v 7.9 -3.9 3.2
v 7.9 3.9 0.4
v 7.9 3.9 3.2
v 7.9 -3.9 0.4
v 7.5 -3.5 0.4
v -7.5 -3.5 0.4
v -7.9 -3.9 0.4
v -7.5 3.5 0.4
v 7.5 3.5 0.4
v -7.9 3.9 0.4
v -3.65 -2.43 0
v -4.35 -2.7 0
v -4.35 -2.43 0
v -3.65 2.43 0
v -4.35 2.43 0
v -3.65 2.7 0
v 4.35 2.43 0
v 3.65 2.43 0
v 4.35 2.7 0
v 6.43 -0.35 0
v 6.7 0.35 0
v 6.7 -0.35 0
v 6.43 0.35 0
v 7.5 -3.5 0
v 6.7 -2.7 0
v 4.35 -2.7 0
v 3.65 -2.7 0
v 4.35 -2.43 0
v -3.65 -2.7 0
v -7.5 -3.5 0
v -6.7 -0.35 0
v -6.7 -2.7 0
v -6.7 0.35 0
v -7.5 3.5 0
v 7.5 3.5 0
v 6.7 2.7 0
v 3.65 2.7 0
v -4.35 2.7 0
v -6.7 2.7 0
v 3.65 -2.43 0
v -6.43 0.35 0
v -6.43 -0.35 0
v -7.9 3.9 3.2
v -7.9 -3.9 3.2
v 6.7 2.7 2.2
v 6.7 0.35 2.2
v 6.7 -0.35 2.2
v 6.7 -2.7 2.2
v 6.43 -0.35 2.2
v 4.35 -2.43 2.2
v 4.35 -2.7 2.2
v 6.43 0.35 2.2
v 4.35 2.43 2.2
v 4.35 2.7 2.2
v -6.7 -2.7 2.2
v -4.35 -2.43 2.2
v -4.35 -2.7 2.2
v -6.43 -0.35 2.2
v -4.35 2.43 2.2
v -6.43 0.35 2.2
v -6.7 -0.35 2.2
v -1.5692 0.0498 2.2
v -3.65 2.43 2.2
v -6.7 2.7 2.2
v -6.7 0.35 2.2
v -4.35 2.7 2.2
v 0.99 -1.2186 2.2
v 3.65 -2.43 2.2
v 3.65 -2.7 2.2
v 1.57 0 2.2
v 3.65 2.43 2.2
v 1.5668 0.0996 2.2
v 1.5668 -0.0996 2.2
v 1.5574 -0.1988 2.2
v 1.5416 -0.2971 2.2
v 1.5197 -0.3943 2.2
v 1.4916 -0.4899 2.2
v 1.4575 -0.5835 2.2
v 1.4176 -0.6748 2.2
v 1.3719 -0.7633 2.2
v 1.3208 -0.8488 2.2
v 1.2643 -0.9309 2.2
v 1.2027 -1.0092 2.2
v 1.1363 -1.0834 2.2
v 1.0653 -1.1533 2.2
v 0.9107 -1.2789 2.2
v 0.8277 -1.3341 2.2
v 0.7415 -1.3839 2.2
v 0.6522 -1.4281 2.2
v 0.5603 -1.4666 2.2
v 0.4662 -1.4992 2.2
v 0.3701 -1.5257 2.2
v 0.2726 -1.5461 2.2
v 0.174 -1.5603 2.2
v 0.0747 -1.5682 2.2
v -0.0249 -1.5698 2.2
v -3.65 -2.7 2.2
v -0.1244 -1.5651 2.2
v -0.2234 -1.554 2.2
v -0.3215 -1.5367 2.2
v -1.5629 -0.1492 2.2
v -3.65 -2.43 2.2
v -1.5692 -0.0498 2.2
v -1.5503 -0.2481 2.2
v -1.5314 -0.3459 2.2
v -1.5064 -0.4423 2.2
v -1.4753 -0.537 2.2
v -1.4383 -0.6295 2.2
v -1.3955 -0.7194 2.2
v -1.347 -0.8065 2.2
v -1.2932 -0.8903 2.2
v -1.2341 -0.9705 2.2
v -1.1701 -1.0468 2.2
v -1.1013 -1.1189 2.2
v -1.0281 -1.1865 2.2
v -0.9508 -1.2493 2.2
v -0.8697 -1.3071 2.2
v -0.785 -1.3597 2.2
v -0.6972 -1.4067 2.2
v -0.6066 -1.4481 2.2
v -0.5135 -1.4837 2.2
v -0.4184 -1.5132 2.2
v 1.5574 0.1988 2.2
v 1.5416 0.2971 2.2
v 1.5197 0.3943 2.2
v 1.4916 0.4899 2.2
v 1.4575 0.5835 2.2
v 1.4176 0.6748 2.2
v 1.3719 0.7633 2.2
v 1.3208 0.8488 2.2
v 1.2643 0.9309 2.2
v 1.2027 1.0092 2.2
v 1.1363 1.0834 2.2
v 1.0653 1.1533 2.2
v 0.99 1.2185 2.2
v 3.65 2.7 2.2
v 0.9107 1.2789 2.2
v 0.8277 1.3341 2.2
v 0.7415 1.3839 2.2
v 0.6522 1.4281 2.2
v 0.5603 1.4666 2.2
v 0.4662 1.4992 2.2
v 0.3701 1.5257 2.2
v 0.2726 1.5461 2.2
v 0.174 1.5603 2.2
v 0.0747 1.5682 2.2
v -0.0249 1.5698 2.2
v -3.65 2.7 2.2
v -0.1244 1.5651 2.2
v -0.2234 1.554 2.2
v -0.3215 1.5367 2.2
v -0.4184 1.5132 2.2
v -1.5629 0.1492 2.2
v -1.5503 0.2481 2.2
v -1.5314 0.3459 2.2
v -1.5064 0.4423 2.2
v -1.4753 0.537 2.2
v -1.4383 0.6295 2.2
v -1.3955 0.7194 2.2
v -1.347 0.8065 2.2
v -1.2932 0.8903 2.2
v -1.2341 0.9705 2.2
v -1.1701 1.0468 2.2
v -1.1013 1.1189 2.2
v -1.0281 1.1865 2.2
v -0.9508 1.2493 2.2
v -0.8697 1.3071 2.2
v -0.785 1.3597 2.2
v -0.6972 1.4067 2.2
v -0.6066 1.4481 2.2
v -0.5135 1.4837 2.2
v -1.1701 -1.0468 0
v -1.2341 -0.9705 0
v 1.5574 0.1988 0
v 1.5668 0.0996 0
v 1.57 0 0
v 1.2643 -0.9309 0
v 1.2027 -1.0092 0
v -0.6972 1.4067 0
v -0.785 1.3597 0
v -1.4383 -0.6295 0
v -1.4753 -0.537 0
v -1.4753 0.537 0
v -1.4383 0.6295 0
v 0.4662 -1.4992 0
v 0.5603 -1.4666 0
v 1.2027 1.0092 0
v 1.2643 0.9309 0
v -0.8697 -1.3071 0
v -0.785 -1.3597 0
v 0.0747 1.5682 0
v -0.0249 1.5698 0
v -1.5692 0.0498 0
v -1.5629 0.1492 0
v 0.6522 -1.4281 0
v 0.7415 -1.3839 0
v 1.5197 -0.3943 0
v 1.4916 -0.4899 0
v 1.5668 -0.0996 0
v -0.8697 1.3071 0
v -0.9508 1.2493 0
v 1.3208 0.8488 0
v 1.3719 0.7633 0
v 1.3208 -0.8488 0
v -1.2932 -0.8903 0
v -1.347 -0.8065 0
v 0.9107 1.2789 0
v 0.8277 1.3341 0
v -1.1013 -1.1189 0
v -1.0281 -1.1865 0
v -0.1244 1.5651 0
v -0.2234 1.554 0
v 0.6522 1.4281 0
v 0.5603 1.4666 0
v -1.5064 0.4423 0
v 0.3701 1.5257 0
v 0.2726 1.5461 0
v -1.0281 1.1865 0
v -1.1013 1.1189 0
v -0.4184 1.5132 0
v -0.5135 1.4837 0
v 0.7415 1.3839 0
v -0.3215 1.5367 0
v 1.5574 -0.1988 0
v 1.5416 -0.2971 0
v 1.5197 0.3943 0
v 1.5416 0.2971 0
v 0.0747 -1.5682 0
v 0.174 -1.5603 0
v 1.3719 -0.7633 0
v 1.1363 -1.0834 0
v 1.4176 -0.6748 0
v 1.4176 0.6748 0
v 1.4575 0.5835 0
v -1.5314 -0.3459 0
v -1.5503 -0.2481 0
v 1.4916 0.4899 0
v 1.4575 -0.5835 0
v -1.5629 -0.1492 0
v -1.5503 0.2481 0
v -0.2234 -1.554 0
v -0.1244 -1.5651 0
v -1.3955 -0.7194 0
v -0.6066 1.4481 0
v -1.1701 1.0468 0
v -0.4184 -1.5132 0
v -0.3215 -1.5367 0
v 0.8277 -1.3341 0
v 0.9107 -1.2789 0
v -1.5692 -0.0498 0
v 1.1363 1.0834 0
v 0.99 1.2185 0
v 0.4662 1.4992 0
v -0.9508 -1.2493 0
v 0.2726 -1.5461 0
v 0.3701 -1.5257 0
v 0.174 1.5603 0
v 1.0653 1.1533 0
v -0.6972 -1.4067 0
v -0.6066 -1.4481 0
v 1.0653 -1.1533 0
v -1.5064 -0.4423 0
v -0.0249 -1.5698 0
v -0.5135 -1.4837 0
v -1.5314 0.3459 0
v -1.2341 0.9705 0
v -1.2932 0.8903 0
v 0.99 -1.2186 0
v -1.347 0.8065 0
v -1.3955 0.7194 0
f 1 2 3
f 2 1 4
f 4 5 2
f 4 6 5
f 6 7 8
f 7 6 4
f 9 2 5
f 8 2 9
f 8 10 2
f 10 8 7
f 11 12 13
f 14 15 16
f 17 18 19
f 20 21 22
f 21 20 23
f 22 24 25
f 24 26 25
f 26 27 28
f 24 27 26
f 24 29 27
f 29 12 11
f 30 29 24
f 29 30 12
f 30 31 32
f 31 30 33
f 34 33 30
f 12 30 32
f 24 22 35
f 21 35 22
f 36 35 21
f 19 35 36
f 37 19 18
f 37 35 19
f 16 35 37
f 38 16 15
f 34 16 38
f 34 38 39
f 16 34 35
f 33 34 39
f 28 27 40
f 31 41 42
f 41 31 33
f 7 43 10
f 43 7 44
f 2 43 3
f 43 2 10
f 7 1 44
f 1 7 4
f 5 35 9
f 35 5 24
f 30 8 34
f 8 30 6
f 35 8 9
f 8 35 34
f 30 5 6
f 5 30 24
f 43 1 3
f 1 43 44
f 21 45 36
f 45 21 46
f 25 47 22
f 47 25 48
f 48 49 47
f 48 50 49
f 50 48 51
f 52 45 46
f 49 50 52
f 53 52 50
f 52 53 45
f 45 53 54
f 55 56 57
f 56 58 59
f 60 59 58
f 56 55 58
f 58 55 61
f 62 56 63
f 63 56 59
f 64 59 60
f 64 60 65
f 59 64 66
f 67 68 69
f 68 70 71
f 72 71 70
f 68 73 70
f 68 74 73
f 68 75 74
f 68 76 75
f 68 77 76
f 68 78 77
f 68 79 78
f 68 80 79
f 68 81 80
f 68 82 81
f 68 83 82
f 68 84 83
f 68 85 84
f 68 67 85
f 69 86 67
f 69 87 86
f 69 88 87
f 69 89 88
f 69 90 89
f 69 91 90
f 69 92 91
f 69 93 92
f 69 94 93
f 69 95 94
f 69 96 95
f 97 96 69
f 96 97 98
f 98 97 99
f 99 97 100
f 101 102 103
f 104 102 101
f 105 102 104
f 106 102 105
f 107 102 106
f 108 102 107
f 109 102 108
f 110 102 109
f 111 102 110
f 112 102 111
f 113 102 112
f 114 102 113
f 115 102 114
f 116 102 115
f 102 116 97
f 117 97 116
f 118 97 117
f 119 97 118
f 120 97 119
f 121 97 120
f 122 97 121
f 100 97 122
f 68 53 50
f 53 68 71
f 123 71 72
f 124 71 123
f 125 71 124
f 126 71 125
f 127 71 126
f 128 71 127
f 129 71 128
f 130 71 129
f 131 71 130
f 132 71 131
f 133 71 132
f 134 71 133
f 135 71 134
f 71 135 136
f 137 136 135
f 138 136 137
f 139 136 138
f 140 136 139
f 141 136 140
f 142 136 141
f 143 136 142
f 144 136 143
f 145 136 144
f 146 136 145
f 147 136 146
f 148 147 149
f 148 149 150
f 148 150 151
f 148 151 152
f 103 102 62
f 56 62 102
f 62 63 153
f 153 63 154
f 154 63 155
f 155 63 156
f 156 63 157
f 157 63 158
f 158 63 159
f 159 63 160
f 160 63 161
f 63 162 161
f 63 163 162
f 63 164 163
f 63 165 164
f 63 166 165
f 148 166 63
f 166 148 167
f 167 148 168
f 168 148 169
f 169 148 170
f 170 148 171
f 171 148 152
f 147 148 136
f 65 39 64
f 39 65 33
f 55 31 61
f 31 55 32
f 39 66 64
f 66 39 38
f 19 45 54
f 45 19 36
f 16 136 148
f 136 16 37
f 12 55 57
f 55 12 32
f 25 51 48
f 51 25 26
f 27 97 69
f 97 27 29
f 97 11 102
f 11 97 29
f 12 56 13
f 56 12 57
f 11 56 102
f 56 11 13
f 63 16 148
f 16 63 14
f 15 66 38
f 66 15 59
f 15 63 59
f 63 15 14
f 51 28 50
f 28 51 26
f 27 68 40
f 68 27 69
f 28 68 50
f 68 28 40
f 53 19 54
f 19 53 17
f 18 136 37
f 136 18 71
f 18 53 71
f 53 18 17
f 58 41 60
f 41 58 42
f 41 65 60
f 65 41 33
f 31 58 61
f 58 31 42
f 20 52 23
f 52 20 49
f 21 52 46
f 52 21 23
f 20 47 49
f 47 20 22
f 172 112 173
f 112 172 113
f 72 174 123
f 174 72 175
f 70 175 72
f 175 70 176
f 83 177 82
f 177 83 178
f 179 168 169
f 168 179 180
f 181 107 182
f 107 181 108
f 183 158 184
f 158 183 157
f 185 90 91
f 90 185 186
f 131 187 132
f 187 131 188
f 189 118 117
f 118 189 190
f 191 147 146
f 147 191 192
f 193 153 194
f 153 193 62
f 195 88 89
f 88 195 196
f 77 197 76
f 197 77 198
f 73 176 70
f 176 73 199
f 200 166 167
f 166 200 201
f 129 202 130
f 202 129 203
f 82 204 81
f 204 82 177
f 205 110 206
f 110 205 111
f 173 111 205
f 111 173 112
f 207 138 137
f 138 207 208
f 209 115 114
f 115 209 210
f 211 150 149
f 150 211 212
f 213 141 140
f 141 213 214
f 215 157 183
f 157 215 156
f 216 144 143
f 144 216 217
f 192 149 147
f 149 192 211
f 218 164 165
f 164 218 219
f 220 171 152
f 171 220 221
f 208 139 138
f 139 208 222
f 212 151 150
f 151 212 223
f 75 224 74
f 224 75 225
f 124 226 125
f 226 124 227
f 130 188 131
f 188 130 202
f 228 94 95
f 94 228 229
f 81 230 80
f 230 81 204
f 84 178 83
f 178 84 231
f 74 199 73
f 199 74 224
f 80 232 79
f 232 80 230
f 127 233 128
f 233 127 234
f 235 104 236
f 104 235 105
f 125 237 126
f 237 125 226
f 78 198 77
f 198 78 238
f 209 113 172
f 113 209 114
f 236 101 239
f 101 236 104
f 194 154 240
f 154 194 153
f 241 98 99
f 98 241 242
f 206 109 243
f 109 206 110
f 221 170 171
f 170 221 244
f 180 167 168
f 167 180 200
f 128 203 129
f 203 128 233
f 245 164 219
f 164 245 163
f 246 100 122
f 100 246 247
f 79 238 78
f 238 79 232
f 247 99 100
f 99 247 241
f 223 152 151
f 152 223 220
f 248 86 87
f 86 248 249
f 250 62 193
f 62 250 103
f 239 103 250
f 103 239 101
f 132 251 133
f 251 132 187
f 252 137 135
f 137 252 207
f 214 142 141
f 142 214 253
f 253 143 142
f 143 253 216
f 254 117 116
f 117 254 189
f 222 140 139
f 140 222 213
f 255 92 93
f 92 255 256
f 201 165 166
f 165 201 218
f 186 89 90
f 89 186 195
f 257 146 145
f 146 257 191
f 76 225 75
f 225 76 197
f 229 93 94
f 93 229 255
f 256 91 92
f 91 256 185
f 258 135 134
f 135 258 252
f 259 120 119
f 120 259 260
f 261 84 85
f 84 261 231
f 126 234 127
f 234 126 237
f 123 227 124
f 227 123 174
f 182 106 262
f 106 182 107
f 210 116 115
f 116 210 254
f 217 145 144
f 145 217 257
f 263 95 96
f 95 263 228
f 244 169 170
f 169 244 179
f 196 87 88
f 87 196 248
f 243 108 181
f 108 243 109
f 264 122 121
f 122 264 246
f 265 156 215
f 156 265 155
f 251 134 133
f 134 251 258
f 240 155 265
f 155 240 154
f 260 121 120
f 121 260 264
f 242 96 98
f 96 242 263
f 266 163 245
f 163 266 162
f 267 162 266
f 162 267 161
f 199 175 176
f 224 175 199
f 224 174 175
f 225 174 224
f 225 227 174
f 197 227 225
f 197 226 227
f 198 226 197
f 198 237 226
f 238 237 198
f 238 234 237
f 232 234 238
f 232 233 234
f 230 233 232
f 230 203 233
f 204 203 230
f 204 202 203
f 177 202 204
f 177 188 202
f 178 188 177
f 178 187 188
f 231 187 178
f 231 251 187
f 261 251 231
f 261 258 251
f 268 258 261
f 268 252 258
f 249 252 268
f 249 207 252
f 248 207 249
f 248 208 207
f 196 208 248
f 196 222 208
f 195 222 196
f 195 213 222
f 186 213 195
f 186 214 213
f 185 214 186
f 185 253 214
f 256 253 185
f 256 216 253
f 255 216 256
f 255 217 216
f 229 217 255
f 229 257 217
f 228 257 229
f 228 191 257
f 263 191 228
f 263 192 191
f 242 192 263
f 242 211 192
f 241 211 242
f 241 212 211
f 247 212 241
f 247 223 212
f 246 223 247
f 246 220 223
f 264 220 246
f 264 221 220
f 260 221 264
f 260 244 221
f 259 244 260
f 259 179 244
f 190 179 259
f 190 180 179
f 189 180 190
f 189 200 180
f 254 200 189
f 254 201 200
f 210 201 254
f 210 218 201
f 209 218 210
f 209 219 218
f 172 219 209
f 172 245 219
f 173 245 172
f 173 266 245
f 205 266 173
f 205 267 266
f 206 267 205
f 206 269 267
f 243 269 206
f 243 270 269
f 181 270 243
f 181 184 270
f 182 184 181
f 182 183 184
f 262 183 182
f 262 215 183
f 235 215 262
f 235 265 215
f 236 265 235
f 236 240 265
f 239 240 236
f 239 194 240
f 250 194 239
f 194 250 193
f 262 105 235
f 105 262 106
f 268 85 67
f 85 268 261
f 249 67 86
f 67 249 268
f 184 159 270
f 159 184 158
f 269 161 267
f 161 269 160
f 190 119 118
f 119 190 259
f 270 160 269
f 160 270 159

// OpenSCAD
use <../LEGO.scad>;

block( width=1, length=2, height=1/3, type="tile" );
